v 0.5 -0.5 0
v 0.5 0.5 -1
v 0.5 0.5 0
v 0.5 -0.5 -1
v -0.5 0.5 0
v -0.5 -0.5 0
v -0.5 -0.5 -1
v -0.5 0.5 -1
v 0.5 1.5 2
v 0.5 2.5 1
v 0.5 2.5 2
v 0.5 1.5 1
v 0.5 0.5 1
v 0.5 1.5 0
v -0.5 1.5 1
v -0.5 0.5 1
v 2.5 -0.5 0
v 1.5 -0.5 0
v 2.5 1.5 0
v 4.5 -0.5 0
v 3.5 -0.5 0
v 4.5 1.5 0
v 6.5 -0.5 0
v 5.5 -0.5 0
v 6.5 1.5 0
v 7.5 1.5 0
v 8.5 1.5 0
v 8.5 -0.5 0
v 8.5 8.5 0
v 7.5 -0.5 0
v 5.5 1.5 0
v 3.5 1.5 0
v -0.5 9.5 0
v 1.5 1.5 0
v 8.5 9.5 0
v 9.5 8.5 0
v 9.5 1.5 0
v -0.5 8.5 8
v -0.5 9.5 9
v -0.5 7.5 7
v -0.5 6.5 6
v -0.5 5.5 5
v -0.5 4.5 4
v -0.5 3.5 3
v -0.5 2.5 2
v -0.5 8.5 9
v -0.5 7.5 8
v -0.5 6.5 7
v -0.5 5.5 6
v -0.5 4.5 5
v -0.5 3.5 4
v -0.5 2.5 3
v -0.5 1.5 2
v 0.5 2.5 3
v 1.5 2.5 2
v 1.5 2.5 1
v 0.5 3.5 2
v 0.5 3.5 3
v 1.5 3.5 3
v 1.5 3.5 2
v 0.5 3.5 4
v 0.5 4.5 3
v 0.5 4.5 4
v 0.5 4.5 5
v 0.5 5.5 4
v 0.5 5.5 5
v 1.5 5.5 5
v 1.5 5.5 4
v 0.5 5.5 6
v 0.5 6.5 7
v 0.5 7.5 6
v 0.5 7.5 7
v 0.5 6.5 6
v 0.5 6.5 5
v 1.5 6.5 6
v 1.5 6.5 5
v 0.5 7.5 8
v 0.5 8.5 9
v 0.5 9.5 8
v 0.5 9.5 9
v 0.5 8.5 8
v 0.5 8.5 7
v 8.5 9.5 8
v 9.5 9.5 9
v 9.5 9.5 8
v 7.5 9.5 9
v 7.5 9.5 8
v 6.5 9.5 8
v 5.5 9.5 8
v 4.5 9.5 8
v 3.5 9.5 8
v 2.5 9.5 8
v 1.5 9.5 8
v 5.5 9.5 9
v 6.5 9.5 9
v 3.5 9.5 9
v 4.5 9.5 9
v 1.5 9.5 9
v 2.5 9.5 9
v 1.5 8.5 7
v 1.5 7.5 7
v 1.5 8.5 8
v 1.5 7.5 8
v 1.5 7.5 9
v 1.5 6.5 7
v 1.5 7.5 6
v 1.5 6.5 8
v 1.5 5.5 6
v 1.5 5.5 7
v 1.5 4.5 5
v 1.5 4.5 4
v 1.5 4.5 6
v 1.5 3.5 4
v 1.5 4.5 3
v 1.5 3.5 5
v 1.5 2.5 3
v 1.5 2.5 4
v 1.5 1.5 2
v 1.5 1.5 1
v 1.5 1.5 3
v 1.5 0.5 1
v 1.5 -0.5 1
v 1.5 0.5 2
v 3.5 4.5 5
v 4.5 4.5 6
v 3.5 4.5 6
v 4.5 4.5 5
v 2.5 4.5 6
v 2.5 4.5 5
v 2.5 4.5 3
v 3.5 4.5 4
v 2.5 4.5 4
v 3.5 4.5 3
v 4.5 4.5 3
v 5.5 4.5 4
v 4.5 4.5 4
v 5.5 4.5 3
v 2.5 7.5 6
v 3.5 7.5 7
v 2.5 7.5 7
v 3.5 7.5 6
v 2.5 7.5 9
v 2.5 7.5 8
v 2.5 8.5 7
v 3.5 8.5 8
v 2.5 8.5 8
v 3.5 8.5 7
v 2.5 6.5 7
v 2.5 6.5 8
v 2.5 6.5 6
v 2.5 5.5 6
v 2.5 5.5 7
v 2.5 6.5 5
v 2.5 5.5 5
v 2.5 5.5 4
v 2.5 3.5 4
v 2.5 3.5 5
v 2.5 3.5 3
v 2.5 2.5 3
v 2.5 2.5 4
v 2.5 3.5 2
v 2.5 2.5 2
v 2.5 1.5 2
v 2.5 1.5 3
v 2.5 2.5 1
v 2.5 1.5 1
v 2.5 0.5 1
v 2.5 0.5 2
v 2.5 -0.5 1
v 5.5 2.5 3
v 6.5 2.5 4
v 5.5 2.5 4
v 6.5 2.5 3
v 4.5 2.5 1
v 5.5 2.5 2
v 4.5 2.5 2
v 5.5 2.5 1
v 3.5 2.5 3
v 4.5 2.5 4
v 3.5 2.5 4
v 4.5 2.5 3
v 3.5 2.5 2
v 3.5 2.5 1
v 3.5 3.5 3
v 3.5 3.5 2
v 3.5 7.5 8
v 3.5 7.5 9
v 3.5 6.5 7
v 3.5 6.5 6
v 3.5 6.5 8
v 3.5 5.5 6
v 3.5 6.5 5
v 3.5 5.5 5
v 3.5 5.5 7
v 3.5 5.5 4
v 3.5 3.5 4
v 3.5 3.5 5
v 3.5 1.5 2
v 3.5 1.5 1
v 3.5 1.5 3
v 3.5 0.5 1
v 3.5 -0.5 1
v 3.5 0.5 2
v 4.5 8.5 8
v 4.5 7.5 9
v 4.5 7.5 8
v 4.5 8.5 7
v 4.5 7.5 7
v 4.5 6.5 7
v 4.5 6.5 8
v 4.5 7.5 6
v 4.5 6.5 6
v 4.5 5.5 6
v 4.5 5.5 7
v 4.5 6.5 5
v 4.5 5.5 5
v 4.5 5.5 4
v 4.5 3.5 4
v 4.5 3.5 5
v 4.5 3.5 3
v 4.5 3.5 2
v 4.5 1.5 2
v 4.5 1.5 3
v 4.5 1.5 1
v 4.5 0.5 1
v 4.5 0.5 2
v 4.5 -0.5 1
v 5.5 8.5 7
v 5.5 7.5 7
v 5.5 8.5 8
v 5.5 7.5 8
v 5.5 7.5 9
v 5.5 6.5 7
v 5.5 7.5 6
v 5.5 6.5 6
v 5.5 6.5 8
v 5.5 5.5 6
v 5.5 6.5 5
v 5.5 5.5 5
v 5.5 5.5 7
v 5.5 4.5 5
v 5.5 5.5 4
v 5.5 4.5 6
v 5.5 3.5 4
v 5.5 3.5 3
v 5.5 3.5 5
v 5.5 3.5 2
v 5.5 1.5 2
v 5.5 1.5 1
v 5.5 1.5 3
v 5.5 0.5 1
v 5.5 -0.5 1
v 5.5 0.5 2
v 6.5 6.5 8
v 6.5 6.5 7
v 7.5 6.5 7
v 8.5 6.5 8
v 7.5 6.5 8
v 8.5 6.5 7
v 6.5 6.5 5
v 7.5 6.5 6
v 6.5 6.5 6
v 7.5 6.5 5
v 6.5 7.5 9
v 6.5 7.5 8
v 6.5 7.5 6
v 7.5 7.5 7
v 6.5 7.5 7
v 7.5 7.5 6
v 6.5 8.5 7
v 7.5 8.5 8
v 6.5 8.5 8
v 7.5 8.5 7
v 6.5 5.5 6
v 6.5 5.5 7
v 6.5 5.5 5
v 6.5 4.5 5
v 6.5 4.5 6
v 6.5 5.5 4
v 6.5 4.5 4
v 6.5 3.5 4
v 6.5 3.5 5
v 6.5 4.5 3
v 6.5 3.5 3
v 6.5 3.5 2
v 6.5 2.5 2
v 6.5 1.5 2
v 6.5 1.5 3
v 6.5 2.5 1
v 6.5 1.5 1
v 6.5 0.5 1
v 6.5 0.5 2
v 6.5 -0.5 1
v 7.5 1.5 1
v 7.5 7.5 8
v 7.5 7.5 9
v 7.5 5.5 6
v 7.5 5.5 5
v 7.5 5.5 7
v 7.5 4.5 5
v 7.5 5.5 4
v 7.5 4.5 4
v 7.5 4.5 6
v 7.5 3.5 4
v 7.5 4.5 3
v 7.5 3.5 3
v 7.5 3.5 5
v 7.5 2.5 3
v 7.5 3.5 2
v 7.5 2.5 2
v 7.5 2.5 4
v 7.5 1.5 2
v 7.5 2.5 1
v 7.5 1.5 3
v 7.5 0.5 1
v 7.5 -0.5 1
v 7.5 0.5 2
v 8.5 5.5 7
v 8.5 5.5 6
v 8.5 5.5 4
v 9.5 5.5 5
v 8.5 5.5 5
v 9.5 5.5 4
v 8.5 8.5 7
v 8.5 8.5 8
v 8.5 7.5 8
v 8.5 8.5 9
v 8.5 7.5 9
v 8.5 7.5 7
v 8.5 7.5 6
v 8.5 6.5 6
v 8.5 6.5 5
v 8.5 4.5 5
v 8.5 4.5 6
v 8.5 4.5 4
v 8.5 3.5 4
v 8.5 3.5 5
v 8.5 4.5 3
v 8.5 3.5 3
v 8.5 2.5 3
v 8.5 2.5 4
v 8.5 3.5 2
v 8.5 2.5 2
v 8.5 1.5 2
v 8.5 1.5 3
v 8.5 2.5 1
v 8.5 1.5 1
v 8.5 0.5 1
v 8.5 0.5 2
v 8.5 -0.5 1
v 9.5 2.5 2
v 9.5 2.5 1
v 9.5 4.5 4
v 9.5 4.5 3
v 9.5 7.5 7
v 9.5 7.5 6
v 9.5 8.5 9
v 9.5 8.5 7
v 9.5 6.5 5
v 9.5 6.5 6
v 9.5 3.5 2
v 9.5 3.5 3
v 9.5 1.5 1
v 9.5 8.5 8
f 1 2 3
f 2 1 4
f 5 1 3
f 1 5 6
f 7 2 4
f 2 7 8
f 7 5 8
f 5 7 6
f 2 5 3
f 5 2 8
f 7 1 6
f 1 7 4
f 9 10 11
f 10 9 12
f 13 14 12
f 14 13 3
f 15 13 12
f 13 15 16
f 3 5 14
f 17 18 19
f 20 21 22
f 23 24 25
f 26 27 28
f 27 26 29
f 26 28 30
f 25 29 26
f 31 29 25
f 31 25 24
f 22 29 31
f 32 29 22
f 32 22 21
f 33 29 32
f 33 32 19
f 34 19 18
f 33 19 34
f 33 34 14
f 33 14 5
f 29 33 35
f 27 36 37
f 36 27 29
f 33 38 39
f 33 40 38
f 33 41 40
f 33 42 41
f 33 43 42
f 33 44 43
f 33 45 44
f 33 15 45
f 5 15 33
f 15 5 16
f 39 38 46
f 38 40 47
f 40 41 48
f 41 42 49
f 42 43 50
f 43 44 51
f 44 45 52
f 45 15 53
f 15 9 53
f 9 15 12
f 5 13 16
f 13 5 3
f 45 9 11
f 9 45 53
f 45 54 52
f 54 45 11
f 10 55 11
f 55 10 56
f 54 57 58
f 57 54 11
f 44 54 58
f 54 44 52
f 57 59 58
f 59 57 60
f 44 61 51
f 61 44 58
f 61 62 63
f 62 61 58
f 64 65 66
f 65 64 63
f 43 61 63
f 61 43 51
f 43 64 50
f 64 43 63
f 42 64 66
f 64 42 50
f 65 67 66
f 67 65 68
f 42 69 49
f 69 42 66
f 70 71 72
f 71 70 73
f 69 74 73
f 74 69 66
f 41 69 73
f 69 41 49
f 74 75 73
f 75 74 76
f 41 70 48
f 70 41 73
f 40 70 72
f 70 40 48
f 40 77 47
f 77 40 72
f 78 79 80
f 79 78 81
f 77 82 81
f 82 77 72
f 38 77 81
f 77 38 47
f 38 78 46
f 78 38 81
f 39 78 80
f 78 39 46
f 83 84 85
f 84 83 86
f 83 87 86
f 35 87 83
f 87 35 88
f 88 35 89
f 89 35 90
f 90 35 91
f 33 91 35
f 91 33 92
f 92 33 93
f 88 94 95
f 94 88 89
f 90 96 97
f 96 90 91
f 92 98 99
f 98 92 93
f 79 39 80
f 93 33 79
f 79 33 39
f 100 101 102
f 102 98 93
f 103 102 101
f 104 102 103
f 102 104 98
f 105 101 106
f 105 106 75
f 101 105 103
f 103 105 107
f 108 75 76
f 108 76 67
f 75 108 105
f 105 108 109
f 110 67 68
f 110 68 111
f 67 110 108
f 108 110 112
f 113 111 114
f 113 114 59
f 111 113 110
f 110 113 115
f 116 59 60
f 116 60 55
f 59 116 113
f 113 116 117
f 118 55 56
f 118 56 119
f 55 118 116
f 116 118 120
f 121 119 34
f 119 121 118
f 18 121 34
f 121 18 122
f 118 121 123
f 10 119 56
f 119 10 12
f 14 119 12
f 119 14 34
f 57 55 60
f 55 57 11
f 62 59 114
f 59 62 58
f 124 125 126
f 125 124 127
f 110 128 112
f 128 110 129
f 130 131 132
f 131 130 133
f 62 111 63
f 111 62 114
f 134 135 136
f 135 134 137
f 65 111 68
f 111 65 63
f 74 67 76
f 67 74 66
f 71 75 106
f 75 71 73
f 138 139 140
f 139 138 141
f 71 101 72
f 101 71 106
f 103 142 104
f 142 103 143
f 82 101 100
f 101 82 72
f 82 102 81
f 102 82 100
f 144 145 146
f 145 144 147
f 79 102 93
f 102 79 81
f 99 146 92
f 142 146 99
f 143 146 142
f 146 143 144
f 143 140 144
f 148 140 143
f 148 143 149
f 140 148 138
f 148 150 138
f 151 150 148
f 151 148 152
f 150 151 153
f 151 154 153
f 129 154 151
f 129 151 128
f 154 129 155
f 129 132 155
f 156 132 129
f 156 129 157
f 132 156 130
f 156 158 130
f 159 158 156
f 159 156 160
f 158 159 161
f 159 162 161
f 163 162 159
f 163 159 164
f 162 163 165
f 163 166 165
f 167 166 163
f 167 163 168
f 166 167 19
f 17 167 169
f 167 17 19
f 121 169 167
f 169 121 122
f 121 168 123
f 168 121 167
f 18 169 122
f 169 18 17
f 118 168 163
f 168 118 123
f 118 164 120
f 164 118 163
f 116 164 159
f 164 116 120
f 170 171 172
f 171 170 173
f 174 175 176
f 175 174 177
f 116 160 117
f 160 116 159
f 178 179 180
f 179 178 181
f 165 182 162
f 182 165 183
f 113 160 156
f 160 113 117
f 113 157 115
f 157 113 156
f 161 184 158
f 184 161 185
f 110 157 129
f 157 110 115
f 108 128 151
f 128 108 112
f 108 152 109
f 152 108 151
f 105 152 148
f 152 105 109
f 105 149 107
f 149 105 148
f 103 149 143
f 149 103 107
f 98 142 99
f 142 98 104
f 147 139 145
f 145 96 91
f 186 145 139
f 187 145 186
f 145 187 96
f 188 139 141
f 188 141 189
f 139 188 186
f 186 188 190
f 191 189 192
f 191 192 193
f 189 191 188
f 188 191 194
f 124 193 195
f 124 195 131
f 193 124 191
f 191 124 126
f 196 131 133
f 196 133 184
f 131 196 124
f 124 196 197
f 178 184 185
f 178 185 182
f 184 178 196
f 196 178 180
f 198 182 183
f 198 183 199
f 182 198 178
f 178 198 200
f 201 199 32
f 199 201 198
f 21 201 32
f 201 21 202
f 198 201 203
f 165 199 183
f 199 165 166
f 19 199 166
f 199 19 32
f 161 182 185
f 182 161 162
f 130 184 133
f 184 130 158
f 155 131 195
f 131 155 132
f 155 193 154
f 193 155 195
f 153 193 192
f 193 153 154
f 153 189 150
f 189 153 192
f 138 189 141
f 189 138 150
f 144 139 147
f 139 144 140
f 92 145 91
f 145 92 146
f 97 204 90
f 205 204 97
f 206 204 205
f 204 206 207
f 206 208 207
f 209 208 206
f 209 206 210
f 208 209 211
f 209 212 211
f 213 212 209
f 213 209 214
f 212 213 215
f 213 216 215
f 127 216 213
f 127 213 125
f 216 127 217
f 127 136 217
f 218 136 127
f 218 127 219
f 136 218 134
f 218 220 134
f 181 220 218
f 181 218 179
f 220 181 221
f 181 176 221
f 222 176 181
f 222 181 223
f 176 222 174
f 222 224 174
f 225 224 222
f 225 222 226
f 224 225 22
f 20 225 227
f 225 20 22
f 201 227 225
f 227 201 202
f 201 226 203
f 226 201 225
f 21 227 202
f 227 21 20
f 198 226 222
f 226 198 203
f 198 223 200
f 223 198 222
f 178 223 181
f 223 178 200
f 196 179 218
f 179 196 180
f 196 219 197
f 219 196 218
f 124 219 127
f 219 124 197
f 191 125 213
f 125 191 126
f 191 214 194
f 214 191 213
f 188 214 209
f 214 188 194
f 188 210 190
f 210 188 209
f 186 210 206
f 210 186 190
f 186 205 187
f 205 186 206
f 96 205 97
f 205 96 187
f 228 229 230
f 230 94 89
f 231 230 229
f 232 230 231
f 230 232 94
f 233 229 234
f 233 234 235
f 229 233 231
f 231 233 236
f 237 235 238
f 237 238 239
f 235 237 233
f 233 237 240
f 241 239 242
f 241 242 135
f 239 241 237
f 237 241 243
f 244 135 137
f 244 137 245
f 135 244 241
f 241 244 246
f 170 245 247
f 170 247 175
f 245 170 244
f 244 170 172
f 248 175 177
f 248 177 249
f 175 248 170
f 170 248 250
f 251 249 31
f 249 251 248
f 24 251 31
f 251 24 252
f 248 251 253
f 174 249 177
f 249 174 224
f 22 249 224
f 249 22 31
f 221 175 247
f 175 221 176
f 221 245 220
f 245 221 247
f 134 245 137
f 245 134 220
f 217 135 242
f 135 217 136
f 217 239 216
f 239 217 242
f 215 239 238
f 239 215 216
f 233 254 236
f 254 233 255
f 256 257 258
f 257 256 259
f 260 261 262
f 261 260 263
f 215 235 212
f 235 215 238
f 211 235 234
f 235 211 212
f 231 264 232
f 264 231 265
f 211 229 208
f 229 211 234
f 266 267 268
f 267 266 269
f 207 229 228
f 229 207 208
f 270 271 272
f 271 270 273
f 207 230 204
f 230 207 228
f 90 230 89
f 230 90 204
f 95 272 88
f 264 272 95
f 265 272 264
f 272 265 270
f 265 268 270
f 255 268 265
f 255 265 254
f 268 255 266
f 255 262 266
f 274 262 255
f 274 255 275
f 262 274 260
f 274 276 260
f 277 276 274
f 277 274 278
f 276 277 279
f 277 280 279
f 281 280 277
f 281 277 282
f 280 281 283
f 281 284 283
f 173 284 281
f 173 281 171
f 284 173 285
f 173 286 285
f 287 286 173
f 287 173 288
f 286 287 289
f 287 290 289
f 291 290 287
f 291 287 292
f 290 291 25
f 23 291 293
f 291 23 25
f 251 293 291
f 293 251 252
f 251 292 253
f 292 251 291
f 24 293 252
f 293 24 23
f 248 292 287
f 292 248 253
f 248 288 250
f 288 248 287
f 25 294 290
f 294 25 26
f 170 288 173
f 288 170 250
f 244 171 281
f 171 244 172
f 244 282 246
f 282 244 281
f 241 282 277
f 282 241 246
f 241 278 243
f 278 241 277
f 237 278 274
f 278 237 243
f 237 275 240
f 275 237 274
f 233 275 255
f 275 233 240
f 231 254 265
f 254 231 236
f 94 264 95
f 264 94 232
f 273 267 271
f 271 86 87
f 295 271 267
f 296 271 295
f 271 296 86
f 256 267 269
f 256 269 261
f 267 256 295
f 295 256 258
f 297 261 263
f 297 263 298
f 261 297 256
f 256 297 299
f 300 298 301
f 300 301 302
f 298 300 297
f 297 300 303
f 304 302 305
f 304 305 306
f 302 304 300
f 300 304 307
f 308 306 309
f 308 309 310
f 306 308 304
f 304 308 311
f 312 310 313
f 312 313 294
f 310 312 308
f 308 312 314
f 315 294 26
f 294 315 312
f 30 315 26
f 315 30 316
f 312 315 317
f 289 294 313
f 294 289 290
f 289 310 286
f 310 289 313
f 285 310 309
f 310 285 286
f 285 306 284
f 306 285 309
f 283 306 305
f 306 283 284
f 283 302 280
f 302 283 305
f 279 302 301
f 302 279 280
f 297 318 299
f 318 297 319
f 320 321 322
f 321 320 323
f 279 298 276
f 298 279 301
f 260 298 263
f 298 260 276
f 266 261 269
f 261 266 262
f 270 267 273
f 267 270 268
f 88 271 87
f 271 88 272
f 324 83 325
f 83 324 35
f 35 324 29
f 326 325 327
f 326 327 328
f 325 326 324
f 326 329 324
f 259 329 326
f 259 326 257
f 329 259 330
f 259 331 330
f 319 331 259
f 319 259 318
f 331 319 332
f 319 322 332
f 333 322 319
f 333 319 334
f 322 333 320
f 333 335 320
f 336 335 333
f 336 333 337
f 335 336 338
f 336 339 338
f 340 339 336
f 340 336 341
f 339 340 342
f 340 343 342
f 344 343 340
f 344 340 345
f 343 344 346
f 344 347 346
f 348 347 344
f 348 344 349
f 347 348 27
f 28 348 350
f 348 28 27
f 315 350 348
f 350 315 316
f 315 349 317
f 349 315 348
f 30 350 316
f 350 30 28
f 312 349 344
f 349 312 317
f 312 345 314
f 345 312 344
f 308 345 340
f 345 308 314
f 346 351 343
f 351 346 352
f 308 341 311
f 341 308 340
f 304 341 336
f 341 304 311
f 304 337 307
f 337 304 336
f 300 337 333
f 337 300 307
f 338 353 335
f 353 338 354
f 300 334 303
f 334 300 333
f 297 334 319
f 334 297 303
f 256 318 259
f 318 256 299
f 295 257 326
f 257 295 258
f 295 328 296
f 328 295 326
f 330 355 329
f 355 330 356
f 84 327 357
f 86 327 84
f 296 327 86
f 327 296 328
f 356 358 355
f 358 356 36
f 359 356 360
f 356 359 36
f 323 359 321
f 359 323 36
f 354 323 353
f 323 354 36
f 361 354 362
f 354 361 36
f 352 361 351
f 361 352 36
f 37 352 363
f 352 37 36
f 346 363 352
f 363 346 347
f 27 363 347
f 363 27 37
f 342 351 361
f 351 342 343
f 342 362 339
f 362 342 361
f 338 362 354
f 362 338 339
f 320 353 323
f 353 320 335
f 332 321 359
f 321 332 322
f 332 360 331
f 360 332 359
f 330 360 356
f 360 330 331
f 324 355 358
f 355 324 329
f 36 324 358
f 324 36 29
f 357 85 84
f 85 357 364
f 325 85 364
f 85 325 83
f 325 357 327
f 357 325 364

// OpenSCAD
union() {
    translate([0, 0, -0.5]) color([1, 0, 0]) cube([1, 1, 1], center=true);
    translate([0, 1, 0.5]) cube([1, 1, 1], center=true);
    translate([0, 2, 1.0]) cube([1, 1, 2], center=true);
    translate([0, 3, 1.5]) cube([1, 1, 3], center=true);
    translate([0, 4, 2.0]) cube([1, 1, 4], center=true);
    translate([0, 5, 2.5]) cube([1, 1, 5], center=true);
    translate([0, 6, 3.0]) cube([1, 1, 6], center=true);
    translate([0, 7, 3.5]) cube([1, 1, 7], center=true);
    translate([0, 8, 4.0]) cube([1, 1, 8], center=true);
    translate([0, 9, 4.5]) cube([1, 1, 9], center=true);
    translate([1, 2, 0.5]) cube([1, 1, 1], center=true);
    translate([1, 3, 1.0]) cube([1, 1, 2], center=true);
    translate([1, 4, 1.5]) cube([1, 1, 3], center=true);
    translate([1, 5, 2.0]) cube([1, 1, 4], center=true);
    translate([1, 6, 2.5]) cube([1, 1, 5], center=true);
    translate([1, 7, 3.0]) cube([1, 1, 6], center=true);
    translate([1, 8, 3.5]) cube([1, 1, 7], center=true);
    translate([1, 9, 4.0]) cube([1, 1, 8], center=true);
    translate([2, 0, 0.5]) cube([1, 1, 1], center=true);
    translate([2, 1, 1.0]) cube([1, 1, 2], center=true);
    translate([2, 2, 1.5]) cube([1, 1, 3], center=true);
    translate([2, 3, 2.0]) cube([1, 1, 4], center=true);
    translate([2, 4, 2.5]) cube([1, 1, 5], center=true);
    translate([2, 5, 3.0]) cube([1, 1, 6], center=true);
    translate([2, 6, 3.5]) cube([1, 1, 7], center=true);
    translate([2, 7, 4.0]) cube([1, 1, 8], center=true);
    translate([2, 8, 4.5]) cube([1, 1, 9], center=true);
    translate([2, 9, 4.5]) cube([1, 1, 9], center=true);
    translate([3, 2, 0.5]) cube([1, 1, 1], center=true);
    translate([3, 3, 1.0]) cube([1, 1, 2], center=true);
    translate([3, 4, 1.5]) cube([1, 1, 3], center=true);
    translate([3, 5, 2.0]) cube([1, 1, 4], center=true);
    translate([3, 6, 2.5]) cube([1, 1, 5], center=true);
    translate([3, 7, 3.0]) cube([1, 1, 6], center=true);
    translate([3, 8, 3.5]) cube([1, 1, 7], center=true);
    translate([3, 9, 4.0]) cube([1, 1, 8], center=true);
    translate([4, 0, 0.5]) cube([1, 1, 1], center=true);
    translate([4, 1, 1.0]) cube([1, 1, 2], center=true);
    translate([4, 2, 1.5]) cube([1, 1, 3], center=true);
    translate([4, 3, 2.0]) cube([1, 1, 4], center=true);
    translate([4, 4, 2.5]) cube([1, 1, 5], center=true);
    translate([4, 5, 3.0]) cube([1, 1, 6], center=true);
    translate([4, 6, 3.5]) cube([1, 1, 7], center=true);
    translate([4, 7, 4.0]) cube([1, 1, 8], center=true);
    translate([4, 8, 4.5]) cube([1, 1, 9], center=true);
    translate([4, 9, 4.5]) cube([1, 1, 9], center=true);
    translate([5, 2, 0.5]) cube([1, 1, 1], center=true);
    translate([5, 3, 1.0]) cube([1, 1, 2], center=true);
    translate([5, 4, 1.5]) cube([1, 1, 3], center=true);
    translate([5, 5, 2.0]) cube([1, 1, 4], center=true);
    translate([5, 6, 2.5]) cube([1, 1, 5], center=true);
    translate([5, 7, 3.0]) cube([1, 1, 6], center=true);
    translate([5, 8, 3.5]) cube([1, 1, 7], center=true);
    translate([5, 9, 4.0]) cube([1, 1, 8], center=true);
    translate([6, 0, 0.5]) cube([1, 1, 1], center=true);
    translate([6, 1, 1.0]) cube([1, 1, 2], center=true);
    translate([6, 2, 1.5]) cube([1, 1, 3], center=true);
    translate([6, 3, 2.0]) cube([1, 1, 4], center=true);
    translate([6, 4, 2.5]) cube([1, 1, 5], center=true);
    translate([6, 5, 3.0]) cube([1, 1, 6], center=true);
    translate([6, 6, 3.5]) cube([1, 1, 7], center=true);
    translate([6, 7, 4.0]) cube([1, 1, 8], center=true);
    translate([6, 8, 4.5]) cube([1, 1, 9], center=true);
    translate([6, 9, 4.5]) cube([1, 1, 9], center=true);
    translate([7, 2, 0.5]) cube([1, 1, 1], center=true);
    translate([7, 3, 1.0]) cube([1, 1, 2], center=true);
    translate([7, 4, 1.5]) cube([1, 1, 3], center=true);
    translate([7, 5, 2.0]) cube([1, 1, 4], center=true);
    translate([7, 6, 2.5]) cube([1, 1, 5], center=true);
    translate([7, 7, 3.0]) cube([1, 1, 6], center=true);
    translate([7, 8, 3.5]) cube([1, 1, 7], center=true);
    translate([7, 9, 4.0]) cube([1, 1, 8], center=true);
    translate([8, 0, 0.5]) cube([1, 1, 1], center=true);
    translate([8, 1, 1.0]) cube([1, 1, 2], center=true);
    translate([8, 2, 1.5]) cube([1, 1, 3], center=true);
    translate([8, 3, 2.0]) cube([1, 1, 4], center=true);
    translate([8, 4, 2.5]) cube([1, 1, 5], center=true);
    translate([8, 5, 3.0]) cube([1, 1, 6], center=true);
    translate([8, 6, 3.5]) cube([1, 1, 7], center=true);
    translate([8, 7, 4.0]) cube([1, 1, 8], center=true);
    translate([8, 8, 4.5]) cube([1, 1, 9], center=true);
    translate([8, 9, 4.5]) cube([1, 1, 9], center=true);
    translate([9, 2, 0.5]) cube([1, 1, 1], center=true);
    translate([9, 3, 1.0]) cube([1, 1, 2], center=true);
    translate([9, 4, 1.5]) cube([1, 1, 3], center=true);
    translate([9, 5, 2.0]) cube([1, 1, 4], center=true);
    translate([9, 6, 2.5]) cube([1, 1, 5], center=true);
    translate([9, 7, 3.0]) cube([1, 1, 6], center=true);
    translate([9, 8, 3.5]) cube([1, 1, 7], center=true);
    translate([9, 9, 8.5]) color([0, 0, 1]) cube([1, 1, 1], center=true);
}
